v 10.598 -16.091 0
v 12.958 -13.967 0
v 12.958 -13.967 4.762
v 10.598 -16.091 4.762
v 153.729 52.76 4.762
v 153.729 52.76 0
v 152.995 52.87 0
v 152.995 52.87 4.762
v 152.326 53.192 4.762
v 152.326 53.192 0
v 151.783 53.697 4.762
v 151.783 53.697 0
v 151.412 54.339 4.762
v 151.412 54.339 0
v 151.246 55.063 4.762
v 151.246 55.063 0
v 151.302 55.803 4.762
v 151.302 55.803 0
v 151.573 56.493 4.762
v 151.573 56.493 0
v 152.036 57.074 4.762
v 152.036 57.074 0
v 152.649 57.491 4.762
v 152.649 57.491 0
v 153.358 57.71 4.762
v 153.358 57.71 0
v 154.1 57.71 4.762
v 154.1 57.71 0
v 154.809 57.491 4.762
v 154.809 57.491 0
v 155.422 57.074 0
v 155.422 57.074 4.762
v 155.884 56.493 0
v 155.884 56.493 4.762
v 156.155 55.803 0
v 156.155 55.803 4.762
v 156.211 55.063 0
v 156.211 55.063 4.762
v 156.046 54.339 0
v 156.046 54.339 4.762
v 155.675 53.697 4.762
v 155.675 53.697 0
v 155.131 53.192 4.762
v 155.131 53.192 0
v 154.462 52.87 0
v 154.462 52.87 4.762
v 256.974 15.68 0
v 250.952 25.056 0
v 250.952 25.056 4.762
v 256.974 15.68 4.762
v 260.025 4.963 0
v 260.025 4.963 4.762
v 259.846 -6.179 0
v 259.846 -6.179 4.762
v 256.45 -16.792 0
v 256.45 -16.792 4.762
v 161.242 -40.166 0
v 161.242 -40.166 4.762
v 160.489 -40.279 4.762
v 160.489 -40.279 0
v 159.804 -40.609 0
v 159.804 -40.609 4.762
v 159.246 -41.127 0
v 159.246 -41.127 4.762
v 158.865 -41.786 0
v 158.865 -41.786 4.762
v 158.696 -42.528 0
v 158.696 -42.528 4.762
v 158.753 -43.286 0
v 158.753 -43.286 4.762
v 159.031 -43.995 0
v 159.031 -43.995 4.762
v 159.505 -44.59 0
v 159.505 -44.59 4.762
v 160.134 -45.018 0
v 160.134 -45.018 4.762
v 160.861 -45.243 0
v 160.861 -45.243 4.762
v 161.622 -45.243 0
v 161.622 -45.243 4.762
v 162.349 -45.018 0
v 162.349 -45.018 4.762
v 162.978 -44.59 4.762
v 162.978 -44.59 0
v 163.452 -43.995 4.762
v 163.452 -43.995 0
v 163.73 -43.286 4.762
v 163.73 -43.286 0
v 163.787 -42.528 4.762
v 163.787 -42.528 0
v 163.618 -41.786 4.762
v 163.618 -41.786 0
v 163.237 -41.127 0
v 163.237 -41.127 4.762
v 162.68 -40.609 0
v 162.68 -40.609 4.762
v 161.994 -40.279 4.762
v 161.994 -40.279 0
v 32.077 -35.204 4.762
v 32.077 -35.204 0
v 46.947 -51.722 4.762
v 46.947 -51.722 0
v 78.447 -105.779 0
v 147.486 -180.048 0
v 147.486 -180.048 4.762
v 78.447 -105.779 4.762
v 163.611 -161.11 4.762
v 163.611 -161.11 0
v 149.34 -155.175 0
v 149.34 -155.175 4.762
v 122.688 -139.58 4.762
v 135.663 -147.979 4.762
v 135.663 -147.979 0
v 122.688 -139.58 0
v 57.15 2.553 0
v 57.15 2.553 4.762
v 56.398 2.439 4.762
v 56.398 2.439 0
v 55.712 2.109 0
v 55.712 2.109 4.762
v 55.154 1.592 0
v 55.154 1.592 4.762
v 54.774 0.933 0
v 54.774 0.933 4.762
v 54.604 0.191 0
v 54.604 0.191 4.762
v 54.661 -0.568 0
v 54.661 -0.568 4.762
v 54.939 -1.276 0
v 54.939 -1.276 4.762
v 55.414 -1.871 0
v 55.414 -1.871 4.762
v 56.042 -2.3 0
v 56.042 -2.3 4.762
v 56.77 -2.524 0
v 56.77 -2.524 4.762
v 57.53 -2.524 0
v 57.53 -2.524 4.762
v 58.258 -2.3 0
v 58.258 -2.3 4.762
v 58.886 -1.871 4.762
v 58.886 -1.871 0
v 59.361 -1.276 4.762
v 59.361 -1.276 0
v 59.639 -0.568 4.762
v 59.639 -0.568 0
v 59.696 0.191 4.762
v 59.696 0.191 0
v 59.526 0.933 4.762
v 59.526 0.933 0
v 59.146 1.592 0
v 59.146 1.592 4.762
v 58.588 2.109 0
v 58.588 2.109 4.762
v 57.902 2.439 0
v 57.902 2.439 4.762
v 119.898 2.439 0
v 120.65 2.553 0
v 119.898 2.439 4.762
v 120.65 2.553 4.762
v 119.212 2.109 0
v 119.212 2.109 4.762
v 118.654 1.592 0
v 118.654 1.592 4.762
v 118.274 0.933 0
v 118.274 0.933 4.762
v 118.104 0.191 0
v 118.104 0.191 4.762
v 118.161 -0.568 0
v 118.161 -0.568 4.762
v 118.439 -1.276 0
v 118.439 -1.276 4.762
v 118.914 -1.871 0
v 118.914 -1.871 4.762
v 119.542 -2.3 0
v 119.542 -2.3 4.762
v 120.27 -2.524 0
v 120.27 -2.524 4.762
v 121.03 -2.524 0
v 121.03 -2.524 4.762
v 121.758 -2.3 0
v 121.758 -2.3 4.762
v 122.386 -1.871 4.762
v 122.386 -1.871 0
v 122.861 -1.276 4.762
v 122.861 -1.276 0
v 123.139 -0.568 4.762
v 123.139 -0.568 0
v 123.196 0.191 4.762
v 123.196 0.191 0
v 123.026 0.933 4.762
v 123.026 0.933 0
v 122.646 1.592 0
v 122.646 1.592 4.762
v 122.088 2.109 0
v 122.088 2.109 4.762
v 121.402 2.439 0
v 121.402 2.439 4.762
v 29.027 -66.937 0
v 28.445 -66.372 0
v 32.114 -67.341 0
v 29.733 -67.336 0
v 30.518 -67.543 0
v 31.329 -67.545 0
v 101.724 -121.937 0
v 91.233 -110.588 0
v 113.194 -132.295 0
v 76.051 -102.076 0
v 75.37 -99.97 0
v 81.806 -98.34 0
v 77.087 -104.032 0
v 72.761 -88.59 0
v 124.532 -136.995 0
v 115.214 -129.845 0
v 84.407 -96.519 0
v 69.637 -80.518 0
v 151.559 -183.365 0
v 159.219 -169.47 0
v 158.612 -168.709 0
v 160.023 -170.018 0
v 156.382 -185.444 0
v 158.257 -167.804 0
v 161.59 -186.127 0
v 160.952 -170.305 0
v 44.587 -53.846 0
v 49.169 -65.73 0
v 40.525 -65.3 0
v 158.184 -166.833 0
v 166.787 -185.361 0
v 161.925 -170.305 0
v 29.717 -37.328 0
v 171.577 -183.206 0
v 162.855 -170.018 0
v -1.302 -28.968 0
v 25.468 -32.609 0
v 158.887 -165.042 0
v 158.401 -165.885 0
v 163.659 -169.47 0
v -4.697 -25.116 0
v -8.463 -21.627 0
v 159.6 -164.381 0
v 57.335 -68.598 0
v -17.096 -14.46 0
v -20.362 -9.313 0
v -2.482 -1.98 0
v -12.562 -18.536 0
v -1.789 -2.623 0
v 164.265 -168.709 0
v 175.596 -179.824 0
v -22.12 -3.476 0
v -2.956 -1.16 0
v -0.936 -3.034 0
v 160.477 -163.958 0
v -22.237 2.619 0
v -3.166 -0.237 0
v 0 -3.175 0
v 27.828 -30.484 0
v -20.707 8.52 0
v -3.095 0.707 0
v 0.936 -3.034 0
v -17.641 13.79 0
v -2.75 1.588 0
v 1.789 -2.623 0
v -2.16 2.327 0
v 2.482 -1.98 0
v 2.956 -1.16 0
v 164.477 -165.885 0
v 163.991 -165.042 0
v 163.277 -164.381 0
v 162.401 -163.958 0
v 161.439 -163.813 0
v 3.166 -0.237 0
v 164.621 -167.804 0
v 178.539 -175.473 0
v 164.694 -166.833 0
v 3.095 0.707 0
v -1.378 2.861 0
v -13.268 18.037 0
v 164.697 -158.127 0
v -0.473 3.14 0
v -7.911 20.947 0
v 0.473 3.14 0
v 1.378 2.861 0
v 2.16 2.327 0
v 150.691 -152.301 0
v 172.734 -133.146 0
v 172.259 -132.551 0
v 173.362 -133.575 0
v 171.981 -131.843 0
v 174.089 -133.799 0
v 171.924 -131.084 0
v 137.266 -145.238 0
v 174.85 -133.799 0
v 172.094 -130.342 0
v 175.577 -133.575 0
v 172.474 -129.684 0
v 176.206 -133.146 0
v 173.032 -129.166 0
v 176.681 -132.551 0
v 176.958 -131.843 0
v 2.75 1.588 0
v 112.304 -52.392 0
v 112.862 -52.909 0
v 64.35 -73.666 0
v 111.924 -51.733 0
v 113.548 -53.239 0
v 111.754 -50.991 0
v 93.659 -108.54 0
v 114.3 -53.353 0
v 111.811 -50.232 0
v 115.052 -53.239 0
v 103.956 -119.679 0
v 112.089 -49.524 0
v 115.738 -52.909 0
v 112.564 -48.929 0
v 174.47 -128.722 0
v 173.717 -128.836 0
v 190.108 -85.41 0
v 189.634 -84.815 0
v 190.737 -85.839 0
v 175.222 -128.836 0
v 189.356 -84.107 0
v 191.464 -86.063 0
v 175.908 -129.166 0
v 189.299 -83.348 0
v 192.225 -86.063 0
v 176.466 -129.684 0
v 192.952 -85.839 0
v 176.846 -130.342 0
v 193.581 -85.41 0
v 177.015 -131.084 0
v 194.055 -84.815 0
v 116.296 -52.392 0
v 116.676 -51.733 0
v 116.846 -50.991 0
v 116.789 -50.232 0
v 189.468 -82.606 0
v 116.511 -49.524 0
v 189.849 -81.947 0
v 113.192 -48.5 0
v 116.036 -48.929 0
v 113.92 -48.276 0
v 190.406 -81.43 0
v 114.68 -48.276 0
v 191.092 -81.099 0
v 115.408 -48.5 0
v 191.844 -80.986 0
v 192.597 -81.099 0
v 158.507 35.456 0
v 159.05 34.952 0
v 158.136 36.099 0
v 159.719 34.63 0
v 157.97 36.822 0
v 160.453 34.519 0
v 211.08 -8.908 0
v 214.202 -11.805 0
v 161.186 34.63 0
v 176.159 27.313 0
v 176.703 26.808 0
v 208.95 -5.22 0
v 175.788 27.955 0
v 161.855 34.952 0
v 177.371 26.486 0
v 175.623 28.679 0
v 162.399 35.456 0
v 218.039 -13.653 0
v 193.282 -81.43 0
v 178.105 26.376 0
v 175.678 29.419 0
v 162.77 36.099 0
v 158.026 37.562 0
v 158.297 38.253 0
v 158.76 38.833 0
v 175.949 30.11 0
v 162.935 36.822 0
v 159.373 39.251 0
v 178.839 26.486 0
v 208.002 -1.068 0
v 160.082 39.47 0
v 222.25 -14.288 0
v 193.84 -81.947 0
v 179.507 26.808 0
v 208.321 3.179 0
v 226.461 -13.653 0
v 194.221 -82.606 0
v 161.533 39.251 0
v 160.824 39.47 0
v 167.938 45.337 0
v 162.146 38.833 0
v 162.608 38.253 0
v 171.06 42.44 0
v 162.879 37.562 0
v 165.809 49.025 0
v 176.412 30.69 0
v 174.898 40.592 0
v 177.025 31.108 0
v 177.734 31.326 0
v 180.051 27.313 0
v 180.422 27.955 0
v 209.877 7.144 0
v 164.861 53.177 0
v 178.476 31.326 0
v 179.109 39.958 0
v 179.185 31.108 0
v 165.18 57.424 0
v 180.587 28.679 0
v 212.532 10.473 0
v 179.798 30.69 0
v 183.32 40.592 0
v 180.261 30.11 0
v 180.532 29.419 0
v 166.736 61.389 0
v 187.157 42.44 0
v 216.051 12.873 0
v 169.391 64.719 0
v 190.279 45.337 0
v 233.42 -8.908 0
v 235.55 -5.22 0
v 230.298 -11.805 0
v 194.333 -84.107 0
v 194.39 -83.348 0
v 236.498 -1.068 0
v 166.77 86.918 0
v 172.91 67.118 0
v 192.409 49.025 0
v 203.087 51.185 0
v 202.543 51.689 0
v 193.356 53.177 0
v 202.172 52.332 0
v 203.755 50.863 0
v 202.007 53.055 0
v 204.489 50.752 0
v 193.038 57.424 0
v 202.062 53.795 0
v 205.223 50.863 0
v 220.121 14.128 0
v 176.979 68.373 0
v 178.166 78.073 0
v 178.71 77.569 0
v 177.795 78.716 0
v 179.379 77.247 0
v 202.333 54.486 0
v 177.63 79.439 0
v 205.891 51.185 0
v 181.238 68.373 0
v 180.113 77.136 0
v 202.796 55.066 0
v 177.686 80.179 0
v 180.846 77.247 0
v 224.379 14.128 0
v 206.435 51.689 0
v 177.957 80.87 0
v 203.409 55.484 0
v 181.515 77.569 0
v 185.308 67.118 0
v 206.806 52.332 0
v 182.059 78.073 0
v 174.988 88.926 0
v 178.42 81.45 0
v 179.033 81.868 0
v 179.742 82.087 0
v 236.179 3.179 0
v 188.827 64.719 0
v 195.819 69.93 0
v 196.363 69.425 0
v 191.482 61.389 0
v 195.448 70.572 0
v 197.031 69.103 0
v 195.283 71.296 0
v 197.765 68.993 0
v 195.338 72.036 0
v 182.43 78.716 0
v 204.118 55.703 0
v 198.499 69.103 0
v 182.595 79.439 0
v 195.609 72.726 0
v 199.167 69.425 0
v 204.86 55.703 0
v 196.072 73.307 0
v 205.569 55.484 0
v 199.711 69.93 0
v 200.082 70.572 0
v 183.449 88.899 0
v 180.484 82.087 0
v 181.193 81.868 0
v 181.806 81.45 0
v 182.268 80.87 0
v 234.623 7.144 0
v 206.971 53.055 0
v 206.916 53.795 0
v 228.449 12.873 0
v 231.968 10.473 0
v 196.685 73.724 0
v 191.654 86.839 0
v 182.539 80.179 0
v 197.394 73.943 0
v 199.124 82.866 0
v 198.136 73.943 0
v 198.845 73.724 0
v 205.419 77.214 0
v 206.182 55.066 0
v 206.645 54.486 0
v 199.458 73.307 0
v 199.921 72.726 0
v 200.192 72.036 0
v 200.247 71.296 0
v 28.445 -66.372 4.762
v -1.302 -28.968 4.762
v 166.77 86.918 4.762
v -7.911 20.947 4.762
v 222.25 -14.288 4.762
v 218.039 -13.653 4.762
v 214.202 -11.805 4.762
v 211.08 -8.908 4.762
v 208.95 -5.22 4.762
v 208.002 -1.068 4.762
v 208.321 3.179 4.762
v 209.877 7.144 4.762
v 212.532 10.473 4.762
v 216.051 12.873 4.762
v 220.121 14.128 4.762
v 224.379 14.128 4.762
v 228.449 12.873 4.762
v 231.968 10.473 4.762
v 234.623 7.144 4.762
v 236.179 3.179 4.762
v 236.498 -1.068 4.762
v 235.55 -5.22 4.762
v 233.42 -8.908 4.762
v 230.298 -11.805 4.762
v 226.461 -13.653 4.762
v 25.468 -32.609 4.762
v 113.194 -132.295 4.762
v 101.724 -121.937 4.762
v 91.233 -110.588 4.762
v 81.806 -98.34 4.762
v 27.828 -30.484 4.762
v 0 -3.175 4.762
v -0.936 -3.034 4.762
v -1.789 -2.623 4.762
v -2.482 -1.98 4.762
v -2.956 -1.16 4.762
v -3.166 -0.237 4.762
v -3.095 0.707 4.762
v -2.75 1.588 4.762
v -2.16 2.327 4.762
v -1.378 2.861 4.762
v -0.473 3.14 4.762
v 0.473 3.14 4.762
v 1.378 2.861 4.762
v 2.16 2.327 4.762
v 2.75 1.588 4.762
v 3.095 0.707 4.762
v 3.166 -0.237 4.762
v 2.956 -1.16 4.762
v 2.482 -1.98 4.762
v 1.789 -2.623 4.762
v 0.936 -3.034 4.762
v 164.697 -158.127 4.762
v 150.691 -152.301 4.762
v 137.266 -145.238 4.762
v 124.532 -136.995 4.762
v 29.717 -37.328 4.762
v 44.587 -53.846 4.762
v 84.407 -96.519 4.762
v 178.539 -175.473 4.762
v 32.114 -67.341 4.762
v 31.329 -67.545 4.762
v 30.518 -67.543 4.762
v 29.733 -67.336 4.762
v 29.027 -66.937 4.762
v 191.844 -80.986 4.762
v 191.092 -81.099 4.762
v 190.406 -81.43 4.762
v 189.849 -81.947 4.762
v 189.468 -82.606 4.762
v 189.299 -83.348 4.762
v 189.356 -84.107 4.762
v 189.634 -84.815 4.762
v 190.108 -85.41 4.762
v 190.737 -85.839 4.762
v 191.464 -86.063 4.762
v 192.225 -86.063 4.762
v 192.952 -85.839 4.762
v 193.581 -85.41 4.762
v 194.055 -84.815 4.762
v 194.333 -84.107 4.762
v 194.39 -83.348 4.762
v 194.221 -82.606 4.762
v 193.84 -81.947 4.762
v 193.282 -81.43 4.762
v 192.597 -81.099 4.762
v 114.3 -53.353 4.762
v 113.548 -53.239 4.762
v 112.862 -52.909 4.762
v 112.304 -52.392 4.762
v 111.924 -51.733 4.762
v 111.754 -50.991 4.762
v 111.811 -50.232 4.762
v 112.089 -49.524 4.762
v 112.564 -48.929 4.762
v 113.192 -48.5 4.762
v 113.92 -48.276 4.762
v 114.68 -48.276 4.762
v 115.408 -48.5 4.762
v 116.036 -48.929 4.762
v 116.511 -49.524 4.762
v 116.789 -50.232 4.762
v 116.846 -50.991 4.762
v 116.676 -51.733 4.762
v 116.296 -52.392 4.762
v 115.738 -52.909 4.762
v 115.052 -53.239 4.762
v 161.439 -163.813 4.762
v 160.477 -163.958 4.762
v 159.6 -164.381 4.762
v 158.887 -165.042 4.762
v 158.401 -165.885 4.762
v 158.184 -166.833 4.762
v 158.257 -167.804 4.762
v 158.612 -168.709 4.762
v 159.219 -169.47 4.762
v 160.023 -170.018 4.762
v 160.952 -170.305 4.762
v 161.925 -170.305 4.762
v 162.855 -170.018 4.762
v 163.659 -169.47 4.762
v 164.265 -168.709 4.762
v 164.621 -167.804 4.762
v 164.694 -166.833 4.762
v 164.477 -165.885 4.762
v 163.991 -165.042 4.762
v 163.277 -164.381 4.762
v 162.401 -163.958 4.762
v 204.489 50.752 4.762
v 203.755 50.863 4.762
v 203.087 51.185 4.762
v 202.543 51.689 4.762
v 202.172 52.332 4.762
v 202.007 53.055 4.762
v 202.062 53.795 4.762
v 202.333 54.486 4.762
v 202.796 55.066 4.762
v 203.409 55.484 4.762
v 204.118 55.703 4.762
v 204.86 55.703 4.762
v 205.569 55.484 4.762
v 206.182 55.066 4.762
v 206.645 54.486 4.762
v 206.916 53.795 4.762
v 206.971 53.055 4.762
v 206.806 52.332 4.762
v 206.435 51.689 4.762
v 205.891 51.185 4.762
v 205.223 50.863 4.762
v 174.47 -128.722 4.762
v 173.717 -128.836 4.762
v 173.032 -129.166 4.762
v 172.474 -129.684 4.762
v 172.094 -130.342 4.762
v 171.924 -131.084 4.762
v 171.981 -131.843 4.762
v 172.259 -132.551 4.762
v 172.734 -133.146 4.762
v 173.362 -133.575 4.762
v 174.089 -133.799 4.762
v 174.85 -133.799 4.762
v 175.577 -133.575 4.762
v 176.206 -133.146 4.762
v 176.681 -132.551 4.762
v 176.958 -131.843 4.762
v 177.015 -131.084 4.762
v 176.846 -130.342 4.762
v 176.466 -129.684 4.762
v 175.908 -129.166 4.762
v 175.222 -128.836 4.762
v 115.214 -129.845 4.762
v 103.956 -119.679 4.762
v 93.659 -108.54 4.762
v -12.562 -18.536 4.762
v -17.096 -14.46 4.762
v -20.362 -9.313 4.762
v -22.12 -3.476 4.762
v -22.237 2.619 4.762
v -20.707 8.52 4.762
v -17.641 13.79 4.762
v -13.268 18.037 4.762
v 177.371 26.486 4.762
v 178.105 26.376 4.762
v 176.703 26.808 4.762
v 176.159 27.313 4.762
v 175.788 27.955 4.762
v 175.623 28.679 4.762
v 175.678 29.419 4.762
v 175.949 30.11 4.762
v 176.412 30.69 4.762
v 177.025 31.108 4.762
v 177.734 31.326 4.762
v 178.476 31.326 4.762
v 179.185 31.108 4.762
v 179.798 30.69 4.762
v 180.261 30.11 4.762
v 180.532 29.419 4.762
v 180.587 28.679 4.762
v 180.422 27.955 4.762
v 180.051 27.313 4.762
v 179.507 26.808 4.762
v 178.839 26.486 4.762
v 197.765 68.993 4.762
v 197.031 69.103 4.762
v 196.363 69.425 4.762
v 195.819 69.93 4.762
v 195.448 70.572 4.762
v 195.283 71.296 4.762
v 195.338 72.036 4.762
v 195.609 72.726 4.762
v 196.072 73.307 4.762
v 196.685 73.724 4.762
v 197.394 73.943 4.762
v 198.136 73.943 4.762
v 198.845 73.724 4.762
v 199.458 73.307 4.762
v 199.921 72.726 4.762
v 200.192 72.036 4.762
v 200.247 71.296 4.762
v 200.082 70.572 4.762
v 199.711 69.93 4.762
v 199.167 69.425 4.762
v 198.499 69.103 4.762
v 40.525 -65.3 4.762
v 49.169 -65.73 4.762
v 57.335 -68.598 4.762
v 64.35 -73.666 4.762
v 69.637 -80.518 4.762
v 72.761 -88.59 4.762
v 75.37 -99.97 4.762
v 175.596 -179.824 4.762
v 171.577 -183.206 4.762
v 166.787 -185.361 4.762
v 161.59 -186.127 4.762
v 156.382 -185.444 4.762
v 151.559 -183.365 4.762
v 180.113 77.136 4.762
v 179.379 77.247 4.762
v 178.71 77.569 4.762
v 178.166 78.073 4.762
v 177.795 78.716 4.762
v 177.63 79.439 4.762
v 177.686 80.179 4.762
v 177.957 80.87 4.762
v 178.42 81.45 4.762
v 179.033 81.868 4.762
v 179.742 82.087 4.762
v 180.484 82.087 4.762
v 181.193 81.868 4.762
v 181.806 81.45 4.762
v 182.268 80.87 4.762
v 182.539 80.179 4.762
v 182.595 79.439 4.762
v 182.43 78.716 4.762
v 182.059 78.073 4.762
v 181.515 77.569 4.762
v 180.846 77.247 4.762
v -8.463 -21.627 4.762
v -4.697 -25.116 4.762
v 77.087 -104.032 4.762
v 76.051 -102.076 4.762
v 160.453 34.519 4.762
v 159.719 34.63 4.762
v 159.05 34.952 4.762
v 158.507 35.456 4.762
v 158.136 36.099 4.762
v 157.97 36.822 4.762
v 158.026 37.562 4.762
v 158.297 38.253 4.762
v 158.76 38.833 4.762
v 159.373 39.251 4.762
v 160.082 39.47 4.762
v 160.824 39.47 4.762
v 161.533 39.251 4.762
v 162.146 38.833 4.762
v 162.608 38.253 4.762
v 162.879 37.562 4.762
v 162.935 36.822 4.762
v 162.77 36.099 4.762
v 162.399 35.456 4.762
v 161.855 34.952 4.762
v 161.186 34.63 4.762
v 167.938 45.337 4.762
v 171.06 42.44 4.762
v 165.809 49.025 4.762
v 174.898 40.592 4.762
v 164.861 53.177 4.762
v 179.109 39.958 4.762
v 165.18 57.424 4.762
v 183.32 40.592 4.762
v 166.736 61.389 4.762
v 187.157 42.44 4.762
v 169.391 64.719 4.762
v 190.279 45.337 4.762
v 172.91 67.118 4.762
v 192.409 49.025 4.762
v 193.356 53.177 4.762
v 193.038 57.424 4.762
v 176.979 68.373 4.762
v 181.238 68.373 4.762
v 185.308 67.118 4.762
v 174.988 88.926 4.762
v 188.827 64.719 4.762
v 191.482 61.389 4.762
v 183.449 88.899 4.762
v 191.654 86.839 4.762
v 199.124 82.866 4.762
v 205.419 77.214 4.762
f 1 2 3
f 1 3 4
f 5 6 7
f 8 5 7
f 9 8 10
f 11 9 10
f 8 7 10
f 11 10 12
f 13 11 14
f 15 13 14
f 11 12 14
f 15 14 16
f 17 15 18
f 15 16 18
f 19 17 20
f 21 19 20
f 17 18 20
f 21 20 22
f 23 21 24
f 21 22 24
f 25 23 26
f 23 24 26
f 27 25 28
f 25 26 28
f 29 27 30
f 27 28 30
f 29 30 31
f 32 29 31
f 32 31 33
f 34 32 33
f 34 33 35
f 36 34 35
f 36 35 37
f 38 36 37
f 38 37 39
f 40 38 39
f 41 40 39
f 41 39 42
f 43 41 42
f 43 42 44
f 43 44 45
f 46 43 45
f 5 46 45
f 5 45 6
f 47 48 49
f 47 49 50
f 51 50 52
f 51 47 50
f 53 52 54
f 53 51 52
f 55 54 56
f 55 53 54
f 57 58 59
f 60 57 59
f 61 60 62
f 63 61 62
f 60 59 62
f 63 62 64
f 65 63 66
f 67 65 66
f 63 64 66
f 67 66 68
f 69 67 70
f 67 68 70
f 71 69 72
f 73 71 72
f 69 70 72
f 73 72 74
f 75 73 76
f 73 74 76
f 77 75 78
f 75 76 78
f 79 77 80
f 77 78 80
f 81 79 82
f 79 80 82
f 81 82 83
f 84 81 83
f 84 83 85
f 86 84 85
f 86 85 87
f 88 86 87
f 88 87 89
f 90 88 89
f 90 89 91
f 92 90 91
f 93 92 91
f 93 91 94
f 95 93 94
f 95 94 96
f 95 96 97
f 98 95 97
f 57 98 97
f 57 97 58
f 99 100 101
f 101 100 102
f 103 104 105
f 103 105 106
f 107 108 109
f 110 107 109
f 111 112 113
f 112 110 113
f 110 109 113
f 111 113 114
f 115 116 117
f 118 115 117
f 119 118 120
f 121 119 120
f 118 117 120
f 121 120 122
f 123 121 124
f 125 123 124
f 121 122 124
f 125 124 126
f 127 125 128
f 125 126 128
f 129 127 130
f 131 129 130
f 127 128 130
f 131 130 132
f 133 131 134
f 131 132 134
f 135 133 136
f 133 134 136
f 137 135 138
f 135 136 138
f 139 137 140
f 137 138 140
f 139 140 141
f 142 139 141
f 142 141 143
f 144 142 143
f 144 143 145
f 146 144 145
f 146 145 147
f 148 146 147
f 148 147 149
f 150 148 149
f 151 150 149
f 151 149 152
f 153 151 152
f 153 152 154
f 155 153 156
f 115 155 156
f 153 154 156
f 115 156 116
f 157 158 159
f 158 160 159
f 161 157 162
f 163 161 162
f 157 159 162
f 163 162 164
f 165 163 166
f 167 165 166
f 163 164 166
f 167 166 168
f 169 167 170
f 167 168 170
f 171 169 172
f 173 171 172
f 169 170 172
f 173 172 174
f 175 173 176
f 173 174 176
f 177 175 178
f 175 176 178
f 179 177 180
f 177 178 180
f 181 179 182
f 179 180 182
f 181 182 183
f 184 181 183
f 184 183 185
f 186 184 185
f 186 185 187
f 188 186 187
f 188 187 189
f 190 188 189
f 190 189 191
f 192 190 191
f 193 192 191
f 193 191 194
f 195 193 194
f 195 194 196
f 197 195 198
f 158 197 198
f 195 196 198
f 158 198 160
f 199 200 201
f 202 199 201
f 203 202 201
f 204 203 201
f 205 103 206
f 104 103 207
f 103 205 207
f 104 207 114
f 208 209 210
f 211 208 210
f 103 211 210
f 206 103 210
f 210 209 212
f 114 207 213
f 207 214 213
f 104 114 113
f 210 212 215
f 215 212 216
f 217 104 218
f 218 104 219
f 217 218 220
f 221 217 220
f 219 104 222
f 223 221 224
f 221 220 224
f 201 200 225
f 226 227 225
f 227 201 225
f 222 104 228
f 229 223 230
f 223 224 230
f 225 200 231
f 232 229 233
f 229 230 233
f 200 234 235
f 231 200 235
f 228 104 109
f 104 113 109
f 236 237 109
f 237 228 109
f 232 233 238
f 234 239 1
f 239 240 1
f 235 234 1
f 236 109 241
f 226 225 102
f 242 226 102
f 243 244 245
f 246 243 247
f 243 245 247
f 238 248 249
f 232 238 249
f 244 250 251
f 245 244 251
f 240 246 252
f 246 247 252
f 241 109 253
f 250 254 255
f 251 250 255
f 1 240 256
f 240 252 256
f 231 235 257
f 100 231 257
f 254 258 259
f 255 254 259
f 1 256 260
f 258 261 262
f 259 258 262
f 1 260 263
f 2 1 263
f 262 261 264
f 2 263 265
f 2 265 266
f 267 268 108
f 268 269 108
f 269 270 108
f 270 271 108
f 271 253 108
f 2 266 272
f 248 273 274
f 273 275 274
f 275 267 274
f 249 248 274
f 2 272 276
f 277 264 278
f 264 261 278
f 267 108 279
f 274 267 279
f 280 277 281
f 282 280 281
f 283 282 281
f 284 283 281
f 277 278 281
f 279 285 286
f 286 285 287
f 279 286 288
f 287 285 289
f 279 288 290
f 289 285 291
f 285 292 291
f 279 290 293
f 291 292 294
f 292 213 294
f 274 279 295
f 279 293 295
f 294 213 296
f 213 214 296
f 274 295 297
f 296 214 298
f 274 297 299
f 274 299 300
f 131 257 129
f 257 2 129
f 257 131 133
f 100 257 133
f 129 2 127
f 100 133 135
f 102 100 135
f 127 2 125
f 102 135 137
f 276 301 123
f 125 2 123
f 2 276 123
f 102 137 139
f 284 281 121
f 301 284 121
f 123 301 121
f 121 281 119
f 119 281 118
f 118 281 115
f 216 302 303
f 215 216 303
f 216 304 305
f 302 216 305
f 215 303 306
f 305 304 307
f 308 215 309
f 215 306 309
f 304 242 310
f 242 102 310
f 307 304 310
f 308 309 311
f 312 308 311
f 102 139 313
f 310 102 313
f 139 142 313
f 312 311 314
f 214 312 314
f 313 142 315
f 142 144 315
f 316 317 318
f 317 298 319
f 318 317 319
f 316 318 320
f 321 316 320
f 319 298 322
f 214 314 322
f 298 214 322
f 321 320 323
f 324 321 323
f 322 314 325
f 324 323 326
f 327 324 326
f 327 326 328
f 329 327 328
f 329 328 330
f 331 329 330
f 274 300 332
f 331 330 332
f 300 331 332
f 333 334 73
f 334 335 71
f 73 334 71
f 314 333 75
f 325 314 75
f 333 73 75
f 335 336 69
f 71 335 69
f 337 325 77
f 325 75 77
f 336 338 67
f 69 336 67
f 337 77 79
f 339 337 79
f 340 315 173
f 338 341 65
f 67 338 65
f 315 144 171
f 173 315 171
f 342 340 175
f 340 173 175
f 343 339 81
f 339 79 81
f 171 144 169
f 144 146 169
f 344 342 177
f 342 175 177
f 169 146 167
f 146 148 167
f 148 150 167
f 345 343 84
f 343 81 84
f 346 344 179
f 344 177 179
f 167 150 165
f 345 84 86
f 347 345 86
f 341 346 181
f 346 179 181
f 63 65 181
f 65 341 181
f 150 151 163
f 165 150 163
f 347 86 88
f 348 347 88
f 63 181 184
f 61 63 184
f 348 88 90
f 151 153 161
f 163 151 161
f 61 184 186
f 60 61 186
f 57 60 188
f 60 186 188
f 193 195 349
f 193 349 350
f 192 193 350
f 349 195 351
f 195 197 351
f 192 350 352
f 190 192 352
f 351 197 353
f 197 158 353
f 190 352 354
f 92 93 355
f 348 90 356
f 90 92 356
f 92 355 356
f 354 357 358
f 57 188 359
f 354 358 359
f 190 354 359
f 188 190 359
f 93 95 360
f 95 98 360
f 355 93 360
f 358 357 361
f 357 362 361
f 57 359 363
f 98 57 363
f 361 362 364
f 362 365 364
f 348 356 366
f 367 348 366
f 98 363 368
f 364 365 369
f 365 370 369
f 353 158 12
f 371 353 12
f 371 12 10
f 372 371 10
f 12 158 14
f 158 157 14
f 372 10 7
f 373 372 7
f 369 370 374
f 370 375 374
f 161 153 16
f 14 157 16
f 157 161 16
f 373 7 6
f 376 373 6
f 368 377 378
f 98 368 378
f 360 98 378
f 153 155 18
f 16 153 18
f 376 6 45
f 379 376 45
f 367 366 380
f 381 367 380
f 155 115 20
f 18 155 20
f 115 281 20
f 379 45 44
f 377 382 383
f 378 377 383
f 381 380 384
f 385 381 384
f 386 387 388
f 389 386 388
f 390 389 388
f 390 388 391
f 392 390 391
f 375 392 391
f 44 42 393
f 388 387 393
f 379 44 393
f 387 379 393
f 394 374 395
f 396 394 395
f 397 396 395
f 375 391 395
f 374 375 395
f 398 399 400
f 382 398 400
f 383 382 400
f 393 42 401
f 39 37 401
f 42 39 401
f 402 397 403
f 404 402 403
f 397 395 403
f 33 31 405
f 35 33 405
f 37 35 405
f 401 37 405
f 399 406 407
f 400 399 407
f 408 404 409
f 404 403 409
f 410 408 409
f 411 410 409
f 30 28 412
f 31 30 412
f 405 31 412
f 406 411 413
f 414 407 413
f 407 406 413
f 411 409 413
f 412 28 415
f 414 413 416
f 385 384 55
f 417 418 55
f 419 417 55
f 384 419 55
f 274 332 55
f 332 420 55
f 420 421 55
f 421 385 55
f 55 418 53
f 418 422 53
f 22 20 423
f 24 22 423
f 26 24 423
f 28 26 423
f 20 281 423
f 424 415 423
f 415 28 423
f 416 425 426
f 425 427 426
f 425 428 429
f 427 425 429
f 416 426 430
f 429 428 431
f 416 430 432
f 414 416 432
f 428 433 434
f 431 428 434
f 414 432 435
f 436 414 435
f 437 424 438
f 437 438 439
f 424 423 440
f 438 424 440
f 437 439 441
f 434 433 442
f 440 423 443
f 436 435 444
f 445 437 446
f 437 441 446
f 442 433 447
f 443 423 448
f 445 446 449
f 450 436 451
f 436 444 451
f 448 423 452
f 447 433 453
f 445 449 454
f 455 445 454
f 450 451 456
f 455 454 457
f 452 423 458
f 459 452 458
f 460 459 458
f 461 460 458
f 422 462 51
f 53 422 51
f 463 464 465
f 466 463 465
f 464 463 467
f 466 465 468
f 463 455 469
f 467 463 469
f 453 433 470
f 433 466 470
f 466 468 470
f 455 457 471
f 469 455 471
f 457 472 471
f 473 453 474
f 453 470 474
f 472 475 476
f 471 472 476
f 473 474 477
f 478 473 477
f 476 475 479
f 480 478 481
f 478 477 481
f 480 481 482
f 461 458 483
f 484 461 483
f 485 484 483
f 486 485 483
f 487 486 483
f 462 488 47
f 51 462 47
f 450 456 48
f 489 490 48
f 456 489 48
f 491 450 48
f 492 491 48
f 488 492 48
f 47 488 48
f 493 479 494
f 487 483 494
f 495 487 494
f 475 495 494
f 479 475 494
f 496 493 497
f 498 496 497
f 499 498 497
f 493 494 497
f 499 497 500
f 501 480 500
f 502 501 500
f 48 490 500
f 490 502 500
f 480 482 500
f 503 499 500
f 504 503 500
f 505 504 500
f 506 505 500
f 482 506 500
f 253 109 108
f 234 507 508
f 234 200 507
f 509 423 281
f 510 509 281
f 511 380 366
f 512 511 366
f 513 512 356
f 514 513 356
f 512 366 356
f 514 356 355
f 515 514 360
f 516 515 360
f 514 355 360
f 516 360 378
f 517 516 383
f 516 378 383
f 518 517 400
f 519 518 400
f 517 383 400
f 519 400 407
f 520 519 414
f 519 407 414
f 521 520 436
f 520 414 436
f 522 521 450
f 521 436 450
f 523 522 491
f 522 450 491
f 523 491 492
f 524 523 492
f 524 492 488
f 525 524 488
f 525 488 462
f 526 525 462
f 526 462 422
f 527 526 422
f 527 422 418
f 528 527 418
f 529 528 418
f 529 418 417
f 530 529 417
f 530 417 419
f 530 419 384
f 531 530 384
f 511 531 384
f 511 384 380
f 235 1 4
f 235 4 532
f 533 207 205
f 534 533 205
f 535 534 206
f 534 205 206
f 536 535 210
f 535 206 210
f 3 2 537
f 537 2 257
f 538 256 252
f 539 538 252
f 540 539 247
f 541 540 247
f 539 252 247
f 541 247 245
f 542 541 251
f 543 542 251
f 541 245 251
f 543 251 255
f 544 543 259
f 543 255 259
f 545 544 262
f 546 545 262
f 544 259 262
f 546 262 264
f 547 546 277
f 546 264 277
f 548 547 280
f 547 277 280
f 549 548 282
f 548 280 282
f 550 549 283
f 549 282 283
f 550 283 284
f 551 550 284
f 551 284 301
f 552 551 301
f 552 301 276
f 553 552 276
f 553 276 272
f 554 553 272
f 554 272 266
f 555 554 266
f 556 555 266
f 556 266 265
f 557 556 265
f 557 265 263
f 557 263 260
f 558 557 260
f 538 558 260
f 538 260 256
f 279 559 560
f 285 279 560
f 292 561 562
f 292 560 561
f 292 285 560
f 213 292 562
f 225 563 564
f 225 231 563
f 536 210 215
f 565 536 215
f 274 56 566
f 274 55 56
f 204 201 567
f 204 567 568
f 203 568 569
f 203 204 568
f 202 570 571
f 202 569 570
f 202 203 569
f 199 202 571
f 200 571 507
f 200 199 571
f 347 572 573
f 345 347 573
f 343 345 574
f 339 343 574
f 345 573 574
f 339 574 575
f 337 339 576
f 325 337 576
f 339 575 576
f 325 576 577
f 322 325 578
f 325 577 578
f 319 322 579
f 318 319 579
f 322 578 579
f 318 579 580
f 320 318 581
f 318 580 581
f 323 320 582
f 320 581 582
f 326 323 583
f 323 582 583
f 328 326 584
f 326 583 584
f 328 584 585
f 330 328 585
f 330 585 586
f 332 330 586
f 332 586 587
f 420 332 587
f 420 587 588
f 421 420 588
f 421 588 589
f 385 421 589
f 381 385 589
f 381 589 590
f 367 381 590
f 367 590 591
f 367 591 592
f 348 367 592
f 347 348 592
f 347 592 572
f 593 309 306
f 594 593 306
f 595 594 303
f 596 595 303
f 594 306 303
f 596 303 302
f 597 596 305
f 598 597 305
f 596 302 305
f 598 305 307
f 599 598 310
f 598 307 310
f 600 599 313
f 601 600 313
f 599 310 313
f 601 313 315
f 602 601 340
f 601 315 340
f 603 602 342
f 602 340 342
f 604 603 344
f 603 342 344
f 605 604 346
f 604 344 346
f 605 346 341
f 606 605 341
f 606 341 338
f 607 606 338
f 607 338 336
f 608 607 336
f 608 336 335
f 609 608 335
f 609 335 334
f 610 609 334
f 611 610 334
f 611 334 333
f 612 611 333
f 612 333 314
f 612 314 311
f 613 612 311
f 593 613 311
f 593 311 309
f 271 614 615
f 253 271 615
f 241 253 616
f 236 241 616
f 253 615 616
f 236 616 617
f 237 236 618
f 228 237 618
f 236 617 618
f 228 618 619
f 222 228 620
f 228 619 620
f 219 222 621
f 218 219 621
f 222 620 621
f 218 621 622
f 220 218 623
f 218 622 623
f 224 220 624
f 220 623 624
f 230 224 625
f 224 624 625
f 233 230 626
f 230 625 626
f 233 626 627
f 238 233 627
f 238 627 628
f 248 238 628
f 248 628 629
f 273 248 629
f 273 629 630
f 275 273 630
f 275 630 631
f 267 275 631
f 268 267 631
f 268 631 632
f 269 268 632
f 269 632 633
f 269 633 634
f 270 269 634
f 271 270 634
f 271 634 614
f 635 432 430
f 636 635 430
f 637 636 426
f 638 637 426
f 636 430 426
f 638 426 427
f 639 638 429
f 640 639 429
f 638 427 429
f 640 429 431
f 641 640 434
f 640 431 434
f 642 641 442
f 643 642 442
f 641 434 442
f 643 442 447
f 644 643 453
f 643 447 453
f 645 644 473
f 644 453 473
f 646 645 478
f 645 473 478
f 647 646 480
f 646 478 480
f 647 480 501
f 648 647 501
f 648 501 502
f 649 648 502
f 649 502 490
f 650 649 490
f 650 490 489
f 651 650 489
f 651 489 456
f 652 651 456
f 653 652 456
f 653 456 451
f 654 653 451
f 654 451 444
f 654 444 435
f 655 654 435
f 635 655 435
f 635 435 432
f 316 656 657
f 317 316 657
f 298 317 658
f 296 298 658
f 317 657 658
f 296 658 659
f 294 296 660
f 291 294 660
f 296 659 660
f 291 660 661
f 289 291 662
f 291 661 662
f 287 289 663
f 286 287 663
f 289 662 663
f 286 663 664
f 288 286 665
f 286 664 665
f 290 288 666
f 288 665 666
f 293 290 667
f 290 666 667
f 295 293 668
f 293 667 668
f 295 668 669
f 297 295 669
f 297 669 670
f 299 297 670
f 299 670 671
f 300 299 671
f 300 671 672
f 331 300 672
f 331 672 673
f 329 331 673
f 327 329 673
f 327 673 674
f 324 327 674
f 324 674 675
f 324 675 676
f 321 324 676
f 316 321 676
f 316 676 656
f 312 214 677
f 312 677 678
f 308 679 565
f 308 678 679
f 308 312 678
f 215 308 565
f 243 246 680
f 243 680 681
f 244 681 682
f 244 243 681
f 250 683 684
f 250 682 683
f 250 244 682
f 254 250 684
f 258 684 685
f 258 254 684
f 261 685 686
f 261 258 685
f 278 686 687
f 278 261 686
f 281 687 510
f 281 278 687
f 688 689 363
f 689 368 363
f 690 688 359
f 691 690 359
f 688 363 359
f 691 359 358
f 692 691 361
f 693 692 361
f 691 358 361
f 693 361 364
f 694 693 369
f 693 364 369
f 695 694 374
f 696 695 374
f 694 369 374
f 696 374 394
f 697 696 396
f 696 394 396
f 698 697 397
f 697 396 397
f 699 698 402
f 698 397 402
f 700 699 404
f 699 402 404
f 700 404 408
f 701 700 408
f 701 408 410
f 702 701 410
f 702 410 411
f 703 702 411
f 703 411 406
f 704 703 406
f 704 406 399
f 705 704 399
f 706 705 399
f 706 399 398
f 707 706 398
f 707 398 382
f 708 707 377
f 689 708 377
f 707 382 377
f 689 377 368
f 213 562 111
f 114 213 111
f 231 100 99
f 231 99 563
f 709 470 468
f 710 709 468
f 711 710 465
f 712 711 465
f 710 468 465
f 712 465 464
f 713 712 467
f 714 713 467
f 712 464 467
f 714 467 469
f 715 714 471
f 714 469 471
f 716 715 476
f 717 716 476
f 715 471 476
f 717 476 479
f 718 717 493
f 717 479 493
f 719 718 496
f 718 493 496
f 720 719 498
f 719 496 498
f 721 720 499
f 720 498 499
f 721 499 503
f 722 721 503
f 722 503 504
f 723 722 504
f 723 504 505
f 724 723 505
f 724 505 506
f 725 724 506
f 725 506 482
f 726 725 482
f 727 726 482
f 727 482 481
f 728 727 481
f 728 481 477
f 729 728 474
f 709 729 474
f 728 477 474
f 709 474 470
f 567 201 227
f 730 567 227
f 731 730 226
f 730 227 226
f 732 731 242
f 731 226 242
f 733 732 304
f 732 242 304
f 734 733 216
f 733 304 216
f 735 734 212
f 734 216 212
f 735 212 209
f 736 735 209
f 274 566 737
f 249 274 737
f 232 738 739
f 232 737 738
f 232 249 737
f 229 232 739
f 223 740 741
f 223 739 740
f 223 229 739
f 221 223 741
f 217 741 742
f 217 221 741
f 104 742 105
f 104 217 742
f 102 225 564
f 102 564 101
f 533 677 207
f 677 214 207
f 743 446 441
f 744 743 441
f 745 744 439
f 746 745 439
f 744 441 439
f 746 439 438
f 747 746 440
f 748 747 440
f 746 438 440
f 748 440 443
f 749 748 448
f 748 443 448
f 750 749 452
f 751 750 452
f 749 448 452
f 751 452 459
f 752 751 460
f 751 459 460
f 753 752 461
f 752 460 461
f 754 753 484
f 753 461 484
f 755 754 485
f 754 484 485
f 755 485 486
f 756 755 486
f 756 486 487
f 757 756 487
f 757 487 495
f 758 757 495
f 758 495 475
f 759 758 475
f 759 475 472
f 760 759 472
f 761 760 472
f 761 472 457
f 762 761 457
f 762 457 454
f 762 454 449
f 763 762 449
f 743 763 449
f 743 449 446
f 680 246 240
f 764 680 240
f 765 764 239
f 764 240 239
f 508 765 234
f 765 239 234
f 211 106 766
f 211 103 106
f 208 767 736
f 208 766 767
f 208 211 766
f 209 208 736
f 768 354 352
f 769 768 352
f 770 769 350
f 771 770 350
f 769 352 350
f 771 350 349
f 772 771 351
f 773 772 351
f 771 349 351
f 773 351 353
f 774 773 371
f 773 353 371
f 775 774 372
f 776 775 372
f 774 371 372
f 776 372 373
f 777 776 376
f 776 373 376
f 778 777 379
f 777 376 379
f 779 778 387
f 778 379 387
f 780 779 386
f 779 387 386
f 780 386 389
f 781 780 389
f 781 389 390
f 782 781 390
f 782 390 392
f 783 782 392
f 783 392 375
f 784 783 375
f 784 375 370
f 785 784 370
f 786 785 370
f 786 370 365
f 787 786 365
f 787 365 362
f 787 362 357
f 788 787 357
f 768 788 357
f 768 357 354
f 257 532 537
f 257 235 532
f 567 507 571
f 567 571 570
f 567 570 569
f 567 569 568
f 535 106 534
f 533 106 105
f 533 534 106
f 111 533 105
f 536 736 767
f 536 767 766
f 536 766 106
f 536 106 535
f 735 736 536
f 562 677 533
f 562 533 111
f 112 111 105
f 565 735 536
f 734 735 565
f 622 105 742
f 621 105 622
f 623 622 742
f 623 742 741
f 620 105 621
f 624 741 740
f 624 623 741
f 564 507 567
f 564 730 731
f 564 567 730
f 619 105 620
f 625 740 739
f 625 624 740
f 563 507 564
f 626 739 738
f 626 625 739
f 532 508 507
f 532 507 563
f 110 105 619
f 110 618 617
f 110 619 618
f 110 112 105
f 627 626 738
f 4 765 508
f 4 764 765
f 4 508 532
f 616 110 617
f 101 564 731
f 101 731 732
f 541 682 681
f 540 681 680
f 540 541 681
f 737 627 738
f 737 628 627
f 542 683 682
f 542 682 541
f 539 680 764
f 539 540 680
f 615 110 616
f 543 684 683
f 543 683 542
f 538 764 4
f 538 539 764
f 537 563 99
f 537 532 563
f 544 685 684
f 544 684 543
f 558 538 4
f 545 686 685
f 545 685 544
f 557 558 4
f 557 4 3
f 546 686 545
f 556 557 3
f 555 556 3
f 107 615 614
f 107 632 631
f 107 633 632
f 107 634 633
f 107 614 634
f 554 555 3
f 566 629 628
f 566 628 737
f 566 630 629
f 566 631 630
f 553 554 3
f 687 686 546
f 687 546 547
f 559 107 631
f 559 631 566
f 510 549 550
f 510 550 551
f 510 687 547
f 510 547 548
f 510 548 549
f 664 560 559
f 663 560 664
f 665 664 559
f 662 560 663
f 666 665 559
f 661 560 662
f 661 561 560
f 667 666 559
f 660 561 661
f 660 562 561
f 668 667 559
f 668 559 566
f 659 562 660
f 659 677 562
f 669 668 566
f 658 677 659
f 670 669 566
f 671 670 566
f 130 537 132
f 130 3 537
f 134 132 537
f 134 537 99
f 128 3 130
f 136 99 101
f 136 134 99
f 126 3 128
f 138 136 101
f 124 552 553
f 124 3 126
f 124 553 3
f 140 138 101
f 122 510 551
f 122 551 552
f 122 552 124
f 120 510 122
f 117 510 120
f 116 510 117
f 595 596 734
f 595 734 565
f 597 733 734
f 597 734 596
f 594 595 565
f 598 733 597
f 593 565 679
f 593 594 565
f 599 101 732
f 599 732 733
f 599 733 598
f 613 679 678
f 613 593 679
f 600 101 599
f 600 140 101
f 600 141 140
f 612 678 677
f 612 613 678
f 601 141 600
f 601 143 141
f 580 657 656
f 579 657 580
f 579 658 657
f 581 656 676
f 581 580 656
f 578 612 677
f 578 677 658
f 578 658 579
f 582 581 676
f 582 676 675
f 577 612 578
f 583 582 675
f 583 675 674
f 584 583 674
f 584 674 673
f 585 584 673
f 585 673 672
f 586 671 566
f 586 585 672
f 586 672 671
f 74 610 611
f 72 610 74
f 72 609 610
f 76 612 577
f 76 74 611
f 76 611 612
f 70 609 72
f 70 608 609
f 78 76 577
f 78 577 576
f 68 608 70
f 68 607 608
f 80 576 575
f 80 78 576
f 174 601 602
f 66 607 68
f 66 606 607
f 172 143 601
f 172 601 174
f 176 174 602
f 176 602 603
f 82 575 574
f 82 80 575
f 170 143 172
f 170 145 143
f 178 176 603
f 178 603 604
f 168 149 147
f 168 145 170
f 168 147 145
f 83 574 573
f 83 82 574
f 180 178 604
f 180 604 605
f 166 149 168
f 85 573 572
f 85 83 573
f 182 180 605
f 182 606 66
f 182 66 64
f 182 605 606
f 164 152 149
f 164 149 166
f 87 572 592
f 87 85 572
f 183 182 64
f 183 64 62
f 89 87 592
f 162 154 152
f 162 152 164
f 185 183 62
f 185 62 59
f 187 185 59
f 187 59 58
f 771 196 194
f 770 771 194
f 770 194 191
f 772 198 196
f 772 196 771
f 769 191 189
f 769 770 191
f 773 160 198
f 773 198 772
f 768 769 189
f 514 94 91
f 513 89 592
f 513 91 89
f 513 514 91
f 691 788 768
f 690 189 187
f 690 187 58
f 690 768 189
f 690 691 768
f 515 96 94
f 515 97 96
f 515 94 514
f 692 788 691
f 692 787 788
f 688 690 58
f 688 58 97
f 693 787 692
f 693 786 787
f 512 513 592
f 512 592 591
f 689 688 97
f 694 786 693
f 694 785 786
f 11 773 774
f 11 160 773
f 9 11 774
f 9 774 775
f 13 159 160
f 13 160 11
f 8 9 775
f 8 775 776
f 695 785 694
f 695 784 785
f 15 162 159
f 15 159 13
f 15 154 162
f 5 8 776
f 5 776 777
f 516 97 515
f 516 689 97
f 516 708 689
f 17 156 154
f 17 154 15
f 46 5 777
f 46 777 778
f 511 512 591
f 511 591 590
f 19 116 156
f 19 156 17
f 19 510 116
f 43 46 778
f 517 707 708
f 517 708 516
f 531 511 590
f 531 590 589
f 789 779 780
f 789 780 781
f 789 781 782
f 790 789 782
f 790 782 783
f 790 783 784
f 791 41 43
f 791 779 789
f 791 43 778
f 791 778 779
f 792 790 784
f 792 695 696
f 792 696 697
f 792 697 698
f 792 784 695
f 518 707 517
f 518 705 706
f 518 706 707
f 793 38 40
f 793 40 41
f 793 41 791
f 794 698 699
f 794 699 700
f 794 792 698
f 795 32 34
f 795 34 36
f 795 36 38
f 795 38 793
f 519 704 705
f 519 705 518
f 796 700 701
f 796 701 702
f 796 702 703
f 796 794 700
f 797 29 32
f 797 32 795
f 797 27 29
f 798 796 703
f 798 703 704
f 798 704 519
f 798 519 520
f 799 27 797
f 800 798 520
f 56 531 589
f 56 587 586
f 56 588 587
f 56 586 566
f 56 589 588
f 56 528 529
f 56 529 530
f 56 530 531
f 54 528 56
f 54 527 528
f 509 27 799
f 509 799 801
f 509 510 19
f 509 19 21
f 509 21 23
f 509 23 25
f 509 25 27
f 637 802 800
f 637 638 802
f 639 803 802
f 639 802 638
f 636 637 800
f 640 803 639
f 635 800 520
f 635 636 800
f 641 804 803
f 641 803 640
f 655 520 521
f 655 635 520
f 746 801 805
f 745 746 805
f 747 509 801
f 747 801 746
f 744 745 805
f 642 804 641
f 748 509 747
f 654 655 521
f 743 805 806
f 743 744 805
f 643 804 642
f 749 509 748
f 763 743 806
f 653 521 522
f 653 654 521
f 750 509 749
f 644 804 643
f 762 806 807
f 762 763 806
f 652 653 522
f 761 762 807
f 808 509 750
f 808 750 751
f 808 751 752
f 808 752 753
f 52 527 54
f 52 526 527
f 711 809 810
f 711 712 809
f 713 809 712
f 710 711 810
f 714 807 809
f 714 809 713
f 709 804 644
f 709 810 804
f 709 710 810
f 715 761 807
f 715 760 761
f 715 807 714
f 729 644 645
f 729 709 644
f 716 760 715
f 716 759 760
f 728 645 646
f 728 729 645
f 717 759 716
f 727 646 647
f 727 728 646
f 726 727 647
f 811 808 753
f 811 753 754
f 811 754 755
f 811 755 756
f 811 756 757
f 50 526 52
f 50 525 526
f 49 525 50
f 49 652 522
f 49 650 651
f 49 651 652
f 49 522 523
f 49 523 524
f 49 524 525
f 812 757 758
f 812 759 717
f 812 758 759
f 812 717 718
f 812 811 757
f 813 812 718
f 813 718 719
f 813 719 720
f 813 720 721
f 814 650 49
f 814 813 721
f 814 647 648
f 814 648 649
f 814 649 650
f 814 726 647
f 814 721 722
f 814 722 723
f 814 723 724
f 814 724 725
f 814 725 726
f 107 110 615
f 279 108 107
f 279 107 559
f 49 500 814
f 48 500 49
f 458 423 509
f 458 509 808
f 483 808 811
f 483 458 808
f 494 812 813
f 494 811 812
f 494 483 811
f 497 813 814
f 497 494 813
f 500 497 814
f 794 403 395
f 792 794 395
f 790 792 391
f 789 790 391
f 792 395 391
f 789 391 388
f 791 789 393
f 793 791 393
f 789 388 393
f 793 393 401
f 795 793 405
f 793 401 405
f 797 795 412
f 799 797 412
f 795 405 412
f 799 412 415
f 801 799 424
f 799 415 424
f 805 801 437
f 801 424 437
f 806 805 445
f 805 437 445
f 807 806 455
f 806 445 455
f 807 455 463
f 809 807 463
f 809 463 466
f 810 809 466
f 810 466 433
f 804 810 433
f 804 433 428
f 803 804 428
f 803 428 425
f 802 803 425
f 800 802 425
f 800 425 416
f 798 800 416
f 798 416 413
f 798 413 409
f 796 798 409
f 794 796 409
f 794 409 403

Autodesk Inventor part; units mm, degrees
ref_plane "YZ Plane" through (0, 0, 0) normal (1, 0, 0) x (0, 1, 0)
ref_plane "XZ Plane" through (0, 0, 0) normal (0, 1, 0) x (-1, 0, 0)
ref_plane "XY Plane" through (0, 0, 0) normal (0, 0, 1) x (1, 0, 0)
sketch "Sketch1" plane through (0, 0, 0) normal (0, 0, 1) x (1, 0, 0)
  arc A0 (-7.9109, 20.947) -> (-12.5617, -18.5355) centre (0, 0) ccw
  circle A1 centre (222.25, 0) radius 38.1 construction
  arc A2 (256.45, -16.7919) -> (250.9516, 25.0564) centre (222.25, 0) ccw
  arc A3 (147.4862, -180.0475) -> (178.5388, -175.4733) centre (161.4388, -167.0773) ccw
  line L0 (0, 0) -> (203.2, 0) construction
  line L1 (222.25, 0) -> (161.4388, -167.0773) construction
  line L2 (0, 149.2071) -> (0, -244.4474) construction
  line L3 (-102.8675, 0) -> (329.7763, 0) construction
  line L4 (0, 0) -> (222.25, 0) construction
  circle A4 centre (187.8917, -94.3987) radius 75.057 construction
  circle A5 centre (222.25, 0) radius 25.4 construction
  circle A6 centre (179.1089, 54.2451) radius 25.4 construction
  arc A7 (205.4187, 77.2135) -> (166.7696, 86.9176) centre (179.1089, 54.2451) ccw
  line L5 (205.4187, 77.2135) -> (250.9516, 25.0564)
  line L6 (166.7696, 86.9176) -> (-7.9109, 20.947)
  line L7 (222.25, 0) -> (179.1089, 54.2451) construction
  circle A8 centre (222.25, 0) radius 45.72 construction
  arc A9 (72.7614, -88.5895) -> (32.1142, -67.3414) centre (43.3613, -95.3285) ccw
  line L8 (43.3613, -95.3285) -> (-19.8796, -15.8102) construction
  line L9 (-19.8796, -15.8102) -> (0, 0) construction
  line L10 (28.4453, -66.3716) -> (-1.3022, -28.9676)
  arc A10 (28.4453, -66.3716) -> (32.1142, -67.3414) centre (30.9303, -64.3953) ccw
  arc A11 (-1.3022, -28.9676) -> (-12.5617, -18.5355) centre (-41.0613, -60.588) ccw
  line L11 (72.7614, -88.5895) -> (75.3699, -99.9695)
  line L12 (256.45, -16.7919) -> (178.5388, -175.4733)
  arc A12 (81.8064, -98.3397) -> (163.6106, -161.1103) centre (222.25, 0) ccw
  line L13 (222.25, 0) -> (81.8064, -98.3397) construction
  line L14 (222.25, 0) -> (163.6106, -161.1103) construction
  line L15 (81.8064, -98.3397) -> (84.4072, -96.5186)
  arc A13 (84.4072, -96.5186) -> (164.6966, -158.1268) centre (222.25, 0) ccw
  arc A14 (115.2139, -129.8451) -> (124.5322, -136.9953) centre (222.25, 0) ccw
  line L16 (115.2139, -129.8451) -> (113.1944, -132.295)
  line L17 (124.5322, -136.9953) -> (122.6885, -139.5801)
  line L18 (12.958, -13.9669) -> (46.9467, -51.7215)
  line L19 (25.3128, -32.7489) -> (27.8281, -30.4845)
  line L20 (32.0767, -35.2038) -> (29.5614, -37.4682)
  line L21 (27.8281, -30.4845) -> (32.0767, -35.2038)
  line L22 (10.5984, -16.0912) -> (44.5871, -53.8458)
  line L23 (44.5871, -53.8458) -> (46.9467, -51.7215)
  line L24 (12.958, -13.9669) -> (10.5984, -16.0912)
  line L25 (160.1656, -159.8564) -> (167.0557, -162.3642) construction
  line L26 (167.0557, -162.3642) -> (168.329, -169.5852) construction
  line L27 (168.329, -169.5852) -> (162.7121, -174.2983) construction
  line L28 (162.7121, -174.2983) -> (155.8219, -171.7905) construction
  line L29 (155.8219, -171.7905) -> (154.5487, -164.5695) construction
  line L30 (154.5487, -164.5695) -> (160.1656, -159.8564) construction
  line L31 (161.4388, -167.0773) -> (163.6106, -161.1103) construction
  line L32 (163.6106, -161.1103) -> (164.6966, -158.1268)
  line L33 (147.4862, -180.0475) -> (78.4471, -105.7788)
  arc A15 (75.3699, -99.9695) -> (78.4471, -105.7788) centre (87.7488, -97.132) ccw
  point P0 (193.7916, 35.7832)
  point P1 (-2.1435, -27.9096)
  point P2 (119.8107, -133.5015)
  point P3 (29.9524, -32.8442)
  point P4 (25.4684, -32.6088)
  point P5 (29.717, -37.3281)
  dimension "d30" = 76.2
  dimension "d110" = 91.44
  dimension "d31" = 44.7822
  dimension "d34" = 177.8
  dimension "d39" = 19.05
  dimension "d80" = 22.3911
  dimension "d86" = 222.25
  dimension "d87" = 0
  dimension "d101" = 70
  dimension "d102" = 150.114
  dimension "d103" = 50.8
  dimension "d107" = 69.3086
  dimension "d108" = 59.0923
  dimension "d109" = 34.925
  dimension "d139" = 60.325
  dimension "d140" = 25.4
  dimension "d141" = 101.6
  dimension "d143" = 3.175
  dimension "d176" = 6.35
  dimension "d180" = 171.45
  dimension "d181" = 35
  dimension "d192" = 50.8
  dimension "d194" = 4
  dimension "d195" = 6.35
  dimension "d198" = 50.8
  dimension "d200" = 3.175
  dimension "d201" = 19.05
  dimension "d202" = 3.5
  dimension "d203" = 172.72
  dimension "d204" = 12.7
  dimension "d205" = 168.275
  dimension "d206" = 177.8
  dimension "d216" = 12.7
  dimension "d217" = 150
  dimension "d218" = 101.6
extrude "Extrusion1" add sketch "Sketch1" along normal blind 4.7625 contours L6 A7 L5 A2 L12 A3 L33 A15 L11 A9 A10 L10 A11 A0 | L16 A13 L17 A12 | L18 L20 L22 L19
sketch "Sketch2" plane through (0, 0, 4.7625) normal (0, 0, 1) x (1, 0, 0)
  arc A0 (147.4862, -180.0475) -> (178.5388, -175.4733) centre (161.4388, -167.0773) ccw
  arc A1 (-7.9109, 20.947) -> (-12.5617, -18.5355) centre (0, 0) ccw
  line L0 (178.5388, -175.4733) -> (256.45, -16.7919)
  arc A2 (256.45, -16.7919) -> (250.9516, 25.0564) centre (222.25, 0) ccw
  line L1 (166.7696, 86.9176) -> (-7.9109, 20.947)
  line L2 (250.9516, 25.0564) -> (205.4187, 77.2135)
  arc A3 (205.4187, 77.2135) -> (166.7696, 86.9176) centre (179.1089, 54.2451) ccw
  line L3 (-1.3022, -28.9676) -> (28.4453, -66.3716)
  arc A4 (72.7614, -88.5895) -> (32.1142, -67.3414) centre (43.3613, -95.3285) ccw
  arc A5 (-1.3022, -28.9676) -> (-12.5617, -18.5355) centre (-41.0613, -60.588) ccw
  arc A6 (28.4453, -66.3716) -> (32.1142, -67.3414) centre (30.9303, -64.3953) ccw
  line L4 (72.7614, -88.5895) -> (75.3699, -99.9695)
  arc A7 (75.3699, -99.9695) -> (78.4471, -105.7788) centre (87.7488, -97.132) ccw
  line L5 (78.4471, -105.7788) -> (147.4862, -180.0475)
hole "Structure Holes" at (0, 0, 4.7625) direction (0, 0, -1) diameter 6.35 end through all
sketch "Sketch4" plane through (0, 0, 4.7625) normal (0, 0, 1) x (1, 0, 0)
  arc A0 (147.4862, -180.0475) -> (178.5388, -175.4733) centre (161.4388, -167.0773) ccw
  arc A1 (-7.9109, 20.947) -> (-12.5617, -18.5355) centre (0, 0) ccw
  line L0 (178.5388, -175.4733) -> (256.45, -16.7919)
  arc A2 (256.45, -16.7919) -> (250.9516, 25.0564) centre (222.25, 0) ccw
  line L1 (0, 0) -> (114.3, -50.8) construction
  line L2 (166.7696, 86.9176) -> (-7.9109, 20.947)
  line L3 (250.9516, 25.0564) -> (205.4187, 77.2135)
  arc A3 (205.4187, 77.2135) -> (166.7696, 86.9176) centre (179.1089, 54.2451) ccw
  line L4 (179.1089, 54.2451) -> (271.2167, -45.4479) construction
  line L5 (-1.3022, -28.9676) -> (28.4453, -66.3716)
  arc A4 (72.7614, -88.5895) -> (32.1142, -67.3414) centre (43.3613, -95.3285) ccw
  arc A5 (-1.3022, -28.9676) -> (-12.5617, -18.5355) centre (-41.0613, -60.588) ccw
  arc A6 (28.4453, -66.3716) -> (32.1142, -67.3414) centre (30.9303, -64.3953) ccw
  line L6 (72.7614, -88.5895) -> (75.3699, -99.9695)
  arc A7 (75.3699, -99.9695) -> (78.4471, -105.7788) centre (87.7488, -97.132) ccw
  line L7 (78.4471, -105.7788) -> (147.4862, -180.0475)
  point P0 (153.7287, 55.2488)
  point P1 (160.4527, 37.0083)
  point P2 (178.1052, 28.8649)
  point P3 (196.3456, 35.5888)
  point P4 (204.489, 53.2413)
  point P5 (197.7651, 71.4818)
  point P6 (180.1126, 79.6252)
  point P7 (161.8721, 72.9013)
  dimension "d83" = 114.3
  dimension "d84" = 50.8
  dimension "d132" = 25.4
  dimension "d135" = 360
hole "BearingHole" at (222.25, 0, 4.7625) at (179.1089, 54.2451, 4.7625) direction (0, 0, -1) diameter 28.575 end through all
hole "Hole4" at (114.3, -50.8, 4.7625) direction (0, 0, -1) diameter 5.1054 end through all
sketch "Sketch3" plane through (0, 0, 0) normal (0, 0, -1) x (-1, 0, 0)
  line L0 (0, 0) -> (-222.25, 0) construction
  line L1 (-222.25, 0) -> (-159.267, -173.0444) construction
  line L2 (-84.8185, 0) -> (-175.2456, -129.1434) construction
  line L3 (-130.032, -64.5717) -> (-161.2417, -42.7184) construction
  point P0 (-184.15, 0)
  point P1 (-120.65, 0)
  point P2 (-57.15, 0)
  point P3 (-209.219, -35.8023)
  point P4 (-191.8444, -83.5387)
  point P5 (-174.4698, -131.2751)
  dimension "d10" = 137.4315
  dimension "d11" = 137.4315
  dimension "d12" = 38.1
  dimension "d43" = 38.1
  dimension "d46" = 63.5
  dimension "d51" = 38.1
  dimension "d54" = 50.8
ref_plane "Inner Pitch Plane" through (0, 0, 0) normal (1, 0, 0) x (0, 1, 0)
hole "Hole6" at (180.1126, 79.6252, 4.7625) at (197.7651, 71.4818, 4.7625) at (204.489, 53.2413, 4.7625) at (178.1052, 28.8649, 4.7625) at (160.4527, 37.0083, 4.7625) at (153.7287, 55.2488, 4.7625) direction (0, 0, -1) diameter 4.9784 end through all
hole "Hole8" at (161.2417, -42.7184, 0) at (0, 0, 0) at (222.25, 0, 0) at (120.65, 0, 0) at (57.15, 0, 0) at (191.8444, -83.5387, 0) at (174.4698, -131.2751, 0) direction (0, 0, 1) diameter 5.1054 end through all
hole "Hole9" at (161.4388, -167.0773, 0) direction (0, 0, 1) diameter 6.5278 end through all
equation "\"d10\" = d11"
equation "\"d51\" = d43"
properties part number "4Bar_Input Side" material "Polycarbonate, Clear"
